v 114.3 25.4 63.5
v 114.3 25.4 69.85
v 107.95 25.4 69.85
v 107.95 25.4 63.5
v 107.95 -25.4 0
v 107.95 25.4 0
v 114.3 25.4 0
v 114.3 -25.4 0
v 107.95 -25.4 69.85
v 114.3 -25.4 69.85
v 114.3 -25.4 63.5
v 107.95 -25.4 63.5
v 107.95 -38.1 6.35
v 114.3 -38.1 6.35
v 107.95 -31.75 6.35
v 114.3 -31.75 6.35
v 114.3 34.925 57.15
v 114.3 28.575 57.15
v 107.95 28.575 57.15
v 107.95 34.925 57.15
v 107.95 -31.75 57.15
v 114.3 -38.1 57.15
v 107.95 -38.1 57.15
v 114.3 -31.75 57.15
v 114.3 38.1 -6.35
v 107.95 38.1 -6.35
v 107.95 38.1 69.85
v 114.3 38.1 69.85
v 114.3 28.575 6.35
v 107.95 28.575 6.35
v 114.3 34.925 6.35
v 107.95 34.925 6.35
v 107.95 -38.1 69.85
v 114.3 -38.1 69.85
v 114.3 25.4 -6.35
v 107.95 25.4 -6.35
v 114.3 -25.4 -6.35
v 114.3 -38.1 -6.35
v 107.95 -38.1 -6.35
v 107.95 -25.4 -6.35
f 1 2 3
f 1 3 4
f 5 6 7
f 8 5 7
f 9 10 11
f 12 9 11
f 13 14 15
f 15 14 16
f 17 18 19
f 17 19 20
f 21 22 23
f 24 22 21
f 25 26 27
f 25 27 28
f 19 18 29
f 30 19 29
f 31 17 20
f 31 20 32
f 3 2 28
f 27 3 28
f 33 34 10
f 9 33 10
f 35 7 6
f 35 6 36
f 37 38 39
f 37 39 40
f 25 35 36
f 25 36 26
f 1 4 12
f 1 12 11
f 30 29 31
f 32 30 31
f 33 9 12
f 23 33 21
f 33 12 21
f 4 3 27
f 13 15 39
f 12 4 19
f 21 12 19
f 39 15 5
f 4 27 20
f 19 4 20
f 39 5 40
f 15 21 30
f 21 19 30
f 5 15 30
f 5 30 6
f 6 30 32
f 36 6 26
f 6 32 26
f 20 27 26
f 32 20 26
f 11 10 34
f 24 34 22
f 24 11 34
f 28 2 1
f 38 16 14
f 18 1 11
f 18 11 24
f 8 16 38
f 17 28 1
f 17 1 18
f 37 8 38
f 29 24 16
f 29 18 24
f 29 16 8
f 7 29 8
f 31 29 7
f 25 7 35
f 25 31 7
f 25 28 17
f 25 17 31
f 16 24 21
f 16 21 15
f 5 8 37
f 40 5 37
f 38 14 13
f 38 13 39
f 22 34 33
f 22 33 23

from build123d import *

# Parameters (mm, degrees)
SKETCH1_W           = 6.35
SKETCH1_H           = 76.2
BOSS_EXTRUDE1_DEPTH = 63.5
SKETCH2_W           = 6.35
SKETCH2_H           = 12.7
BOSS_EXTRUDE2_DEPTH = 6.35
SKETCH3_W           = 50.8
SKETCH3_H           = 6.35
CUT_EXTRUDE1_DEPTH  = 80.818262321


with BuildPart() as part:
    # Sketch1 → Boss-Extrude1 (new body)
    with BuildSketch(Plane.XY):
        with Locations((111.125, 0)):
            Rectangle(SKETCH1_W, SKETCH1_H)
    extrude(amount=BOSS_EXTRUDE1_DEPTH)

    # Sketch2 → Boss-Extrude2 (add)
    with BuildSketch(Plane(origin=(114.3, 0, 0), x_dir=(0, 0, -1), z_dir=(1, 0, 0))):
        with Locations((-66.675, -31.75)):
            Rectangle(SKETCH2_W, SKETCH2_H)
        with Locations((-66.675, 31.75)):
            Rectangle(SKETCH2_W, SKETCH2_H)
        with Locations((3.175, 31.75)):
            Rectangle(SKETCH2_W, SKETCH2_H)
        with Locations((3.175, -31.75)):
            Rectangle(SKETCH2_W, SKETCH2_H)
    extrude(amount=-BOSS_EXTRUDE2_DEPTH)

    # Sketch3 → Cut-Extrude1 (cut, through all)
    with BuildSketch(Plane(origin=(114.3, 0, 0), x_dir=(0, 0, -1), z_dir=(1, 0, 0))):
        with Locations((-31.75, 31.75)):
            Rectangle(SKETCH3_W, SKETCH3_H)
        with Locations((-31.75, -34.925)):
            Rectangle(SKETCH3_W, SKETCH3_H)
    extrude(amount=-CUT_EXTRUDE1_DEPTH, mode=Mode.SUBTRACT)


solid = part.part
